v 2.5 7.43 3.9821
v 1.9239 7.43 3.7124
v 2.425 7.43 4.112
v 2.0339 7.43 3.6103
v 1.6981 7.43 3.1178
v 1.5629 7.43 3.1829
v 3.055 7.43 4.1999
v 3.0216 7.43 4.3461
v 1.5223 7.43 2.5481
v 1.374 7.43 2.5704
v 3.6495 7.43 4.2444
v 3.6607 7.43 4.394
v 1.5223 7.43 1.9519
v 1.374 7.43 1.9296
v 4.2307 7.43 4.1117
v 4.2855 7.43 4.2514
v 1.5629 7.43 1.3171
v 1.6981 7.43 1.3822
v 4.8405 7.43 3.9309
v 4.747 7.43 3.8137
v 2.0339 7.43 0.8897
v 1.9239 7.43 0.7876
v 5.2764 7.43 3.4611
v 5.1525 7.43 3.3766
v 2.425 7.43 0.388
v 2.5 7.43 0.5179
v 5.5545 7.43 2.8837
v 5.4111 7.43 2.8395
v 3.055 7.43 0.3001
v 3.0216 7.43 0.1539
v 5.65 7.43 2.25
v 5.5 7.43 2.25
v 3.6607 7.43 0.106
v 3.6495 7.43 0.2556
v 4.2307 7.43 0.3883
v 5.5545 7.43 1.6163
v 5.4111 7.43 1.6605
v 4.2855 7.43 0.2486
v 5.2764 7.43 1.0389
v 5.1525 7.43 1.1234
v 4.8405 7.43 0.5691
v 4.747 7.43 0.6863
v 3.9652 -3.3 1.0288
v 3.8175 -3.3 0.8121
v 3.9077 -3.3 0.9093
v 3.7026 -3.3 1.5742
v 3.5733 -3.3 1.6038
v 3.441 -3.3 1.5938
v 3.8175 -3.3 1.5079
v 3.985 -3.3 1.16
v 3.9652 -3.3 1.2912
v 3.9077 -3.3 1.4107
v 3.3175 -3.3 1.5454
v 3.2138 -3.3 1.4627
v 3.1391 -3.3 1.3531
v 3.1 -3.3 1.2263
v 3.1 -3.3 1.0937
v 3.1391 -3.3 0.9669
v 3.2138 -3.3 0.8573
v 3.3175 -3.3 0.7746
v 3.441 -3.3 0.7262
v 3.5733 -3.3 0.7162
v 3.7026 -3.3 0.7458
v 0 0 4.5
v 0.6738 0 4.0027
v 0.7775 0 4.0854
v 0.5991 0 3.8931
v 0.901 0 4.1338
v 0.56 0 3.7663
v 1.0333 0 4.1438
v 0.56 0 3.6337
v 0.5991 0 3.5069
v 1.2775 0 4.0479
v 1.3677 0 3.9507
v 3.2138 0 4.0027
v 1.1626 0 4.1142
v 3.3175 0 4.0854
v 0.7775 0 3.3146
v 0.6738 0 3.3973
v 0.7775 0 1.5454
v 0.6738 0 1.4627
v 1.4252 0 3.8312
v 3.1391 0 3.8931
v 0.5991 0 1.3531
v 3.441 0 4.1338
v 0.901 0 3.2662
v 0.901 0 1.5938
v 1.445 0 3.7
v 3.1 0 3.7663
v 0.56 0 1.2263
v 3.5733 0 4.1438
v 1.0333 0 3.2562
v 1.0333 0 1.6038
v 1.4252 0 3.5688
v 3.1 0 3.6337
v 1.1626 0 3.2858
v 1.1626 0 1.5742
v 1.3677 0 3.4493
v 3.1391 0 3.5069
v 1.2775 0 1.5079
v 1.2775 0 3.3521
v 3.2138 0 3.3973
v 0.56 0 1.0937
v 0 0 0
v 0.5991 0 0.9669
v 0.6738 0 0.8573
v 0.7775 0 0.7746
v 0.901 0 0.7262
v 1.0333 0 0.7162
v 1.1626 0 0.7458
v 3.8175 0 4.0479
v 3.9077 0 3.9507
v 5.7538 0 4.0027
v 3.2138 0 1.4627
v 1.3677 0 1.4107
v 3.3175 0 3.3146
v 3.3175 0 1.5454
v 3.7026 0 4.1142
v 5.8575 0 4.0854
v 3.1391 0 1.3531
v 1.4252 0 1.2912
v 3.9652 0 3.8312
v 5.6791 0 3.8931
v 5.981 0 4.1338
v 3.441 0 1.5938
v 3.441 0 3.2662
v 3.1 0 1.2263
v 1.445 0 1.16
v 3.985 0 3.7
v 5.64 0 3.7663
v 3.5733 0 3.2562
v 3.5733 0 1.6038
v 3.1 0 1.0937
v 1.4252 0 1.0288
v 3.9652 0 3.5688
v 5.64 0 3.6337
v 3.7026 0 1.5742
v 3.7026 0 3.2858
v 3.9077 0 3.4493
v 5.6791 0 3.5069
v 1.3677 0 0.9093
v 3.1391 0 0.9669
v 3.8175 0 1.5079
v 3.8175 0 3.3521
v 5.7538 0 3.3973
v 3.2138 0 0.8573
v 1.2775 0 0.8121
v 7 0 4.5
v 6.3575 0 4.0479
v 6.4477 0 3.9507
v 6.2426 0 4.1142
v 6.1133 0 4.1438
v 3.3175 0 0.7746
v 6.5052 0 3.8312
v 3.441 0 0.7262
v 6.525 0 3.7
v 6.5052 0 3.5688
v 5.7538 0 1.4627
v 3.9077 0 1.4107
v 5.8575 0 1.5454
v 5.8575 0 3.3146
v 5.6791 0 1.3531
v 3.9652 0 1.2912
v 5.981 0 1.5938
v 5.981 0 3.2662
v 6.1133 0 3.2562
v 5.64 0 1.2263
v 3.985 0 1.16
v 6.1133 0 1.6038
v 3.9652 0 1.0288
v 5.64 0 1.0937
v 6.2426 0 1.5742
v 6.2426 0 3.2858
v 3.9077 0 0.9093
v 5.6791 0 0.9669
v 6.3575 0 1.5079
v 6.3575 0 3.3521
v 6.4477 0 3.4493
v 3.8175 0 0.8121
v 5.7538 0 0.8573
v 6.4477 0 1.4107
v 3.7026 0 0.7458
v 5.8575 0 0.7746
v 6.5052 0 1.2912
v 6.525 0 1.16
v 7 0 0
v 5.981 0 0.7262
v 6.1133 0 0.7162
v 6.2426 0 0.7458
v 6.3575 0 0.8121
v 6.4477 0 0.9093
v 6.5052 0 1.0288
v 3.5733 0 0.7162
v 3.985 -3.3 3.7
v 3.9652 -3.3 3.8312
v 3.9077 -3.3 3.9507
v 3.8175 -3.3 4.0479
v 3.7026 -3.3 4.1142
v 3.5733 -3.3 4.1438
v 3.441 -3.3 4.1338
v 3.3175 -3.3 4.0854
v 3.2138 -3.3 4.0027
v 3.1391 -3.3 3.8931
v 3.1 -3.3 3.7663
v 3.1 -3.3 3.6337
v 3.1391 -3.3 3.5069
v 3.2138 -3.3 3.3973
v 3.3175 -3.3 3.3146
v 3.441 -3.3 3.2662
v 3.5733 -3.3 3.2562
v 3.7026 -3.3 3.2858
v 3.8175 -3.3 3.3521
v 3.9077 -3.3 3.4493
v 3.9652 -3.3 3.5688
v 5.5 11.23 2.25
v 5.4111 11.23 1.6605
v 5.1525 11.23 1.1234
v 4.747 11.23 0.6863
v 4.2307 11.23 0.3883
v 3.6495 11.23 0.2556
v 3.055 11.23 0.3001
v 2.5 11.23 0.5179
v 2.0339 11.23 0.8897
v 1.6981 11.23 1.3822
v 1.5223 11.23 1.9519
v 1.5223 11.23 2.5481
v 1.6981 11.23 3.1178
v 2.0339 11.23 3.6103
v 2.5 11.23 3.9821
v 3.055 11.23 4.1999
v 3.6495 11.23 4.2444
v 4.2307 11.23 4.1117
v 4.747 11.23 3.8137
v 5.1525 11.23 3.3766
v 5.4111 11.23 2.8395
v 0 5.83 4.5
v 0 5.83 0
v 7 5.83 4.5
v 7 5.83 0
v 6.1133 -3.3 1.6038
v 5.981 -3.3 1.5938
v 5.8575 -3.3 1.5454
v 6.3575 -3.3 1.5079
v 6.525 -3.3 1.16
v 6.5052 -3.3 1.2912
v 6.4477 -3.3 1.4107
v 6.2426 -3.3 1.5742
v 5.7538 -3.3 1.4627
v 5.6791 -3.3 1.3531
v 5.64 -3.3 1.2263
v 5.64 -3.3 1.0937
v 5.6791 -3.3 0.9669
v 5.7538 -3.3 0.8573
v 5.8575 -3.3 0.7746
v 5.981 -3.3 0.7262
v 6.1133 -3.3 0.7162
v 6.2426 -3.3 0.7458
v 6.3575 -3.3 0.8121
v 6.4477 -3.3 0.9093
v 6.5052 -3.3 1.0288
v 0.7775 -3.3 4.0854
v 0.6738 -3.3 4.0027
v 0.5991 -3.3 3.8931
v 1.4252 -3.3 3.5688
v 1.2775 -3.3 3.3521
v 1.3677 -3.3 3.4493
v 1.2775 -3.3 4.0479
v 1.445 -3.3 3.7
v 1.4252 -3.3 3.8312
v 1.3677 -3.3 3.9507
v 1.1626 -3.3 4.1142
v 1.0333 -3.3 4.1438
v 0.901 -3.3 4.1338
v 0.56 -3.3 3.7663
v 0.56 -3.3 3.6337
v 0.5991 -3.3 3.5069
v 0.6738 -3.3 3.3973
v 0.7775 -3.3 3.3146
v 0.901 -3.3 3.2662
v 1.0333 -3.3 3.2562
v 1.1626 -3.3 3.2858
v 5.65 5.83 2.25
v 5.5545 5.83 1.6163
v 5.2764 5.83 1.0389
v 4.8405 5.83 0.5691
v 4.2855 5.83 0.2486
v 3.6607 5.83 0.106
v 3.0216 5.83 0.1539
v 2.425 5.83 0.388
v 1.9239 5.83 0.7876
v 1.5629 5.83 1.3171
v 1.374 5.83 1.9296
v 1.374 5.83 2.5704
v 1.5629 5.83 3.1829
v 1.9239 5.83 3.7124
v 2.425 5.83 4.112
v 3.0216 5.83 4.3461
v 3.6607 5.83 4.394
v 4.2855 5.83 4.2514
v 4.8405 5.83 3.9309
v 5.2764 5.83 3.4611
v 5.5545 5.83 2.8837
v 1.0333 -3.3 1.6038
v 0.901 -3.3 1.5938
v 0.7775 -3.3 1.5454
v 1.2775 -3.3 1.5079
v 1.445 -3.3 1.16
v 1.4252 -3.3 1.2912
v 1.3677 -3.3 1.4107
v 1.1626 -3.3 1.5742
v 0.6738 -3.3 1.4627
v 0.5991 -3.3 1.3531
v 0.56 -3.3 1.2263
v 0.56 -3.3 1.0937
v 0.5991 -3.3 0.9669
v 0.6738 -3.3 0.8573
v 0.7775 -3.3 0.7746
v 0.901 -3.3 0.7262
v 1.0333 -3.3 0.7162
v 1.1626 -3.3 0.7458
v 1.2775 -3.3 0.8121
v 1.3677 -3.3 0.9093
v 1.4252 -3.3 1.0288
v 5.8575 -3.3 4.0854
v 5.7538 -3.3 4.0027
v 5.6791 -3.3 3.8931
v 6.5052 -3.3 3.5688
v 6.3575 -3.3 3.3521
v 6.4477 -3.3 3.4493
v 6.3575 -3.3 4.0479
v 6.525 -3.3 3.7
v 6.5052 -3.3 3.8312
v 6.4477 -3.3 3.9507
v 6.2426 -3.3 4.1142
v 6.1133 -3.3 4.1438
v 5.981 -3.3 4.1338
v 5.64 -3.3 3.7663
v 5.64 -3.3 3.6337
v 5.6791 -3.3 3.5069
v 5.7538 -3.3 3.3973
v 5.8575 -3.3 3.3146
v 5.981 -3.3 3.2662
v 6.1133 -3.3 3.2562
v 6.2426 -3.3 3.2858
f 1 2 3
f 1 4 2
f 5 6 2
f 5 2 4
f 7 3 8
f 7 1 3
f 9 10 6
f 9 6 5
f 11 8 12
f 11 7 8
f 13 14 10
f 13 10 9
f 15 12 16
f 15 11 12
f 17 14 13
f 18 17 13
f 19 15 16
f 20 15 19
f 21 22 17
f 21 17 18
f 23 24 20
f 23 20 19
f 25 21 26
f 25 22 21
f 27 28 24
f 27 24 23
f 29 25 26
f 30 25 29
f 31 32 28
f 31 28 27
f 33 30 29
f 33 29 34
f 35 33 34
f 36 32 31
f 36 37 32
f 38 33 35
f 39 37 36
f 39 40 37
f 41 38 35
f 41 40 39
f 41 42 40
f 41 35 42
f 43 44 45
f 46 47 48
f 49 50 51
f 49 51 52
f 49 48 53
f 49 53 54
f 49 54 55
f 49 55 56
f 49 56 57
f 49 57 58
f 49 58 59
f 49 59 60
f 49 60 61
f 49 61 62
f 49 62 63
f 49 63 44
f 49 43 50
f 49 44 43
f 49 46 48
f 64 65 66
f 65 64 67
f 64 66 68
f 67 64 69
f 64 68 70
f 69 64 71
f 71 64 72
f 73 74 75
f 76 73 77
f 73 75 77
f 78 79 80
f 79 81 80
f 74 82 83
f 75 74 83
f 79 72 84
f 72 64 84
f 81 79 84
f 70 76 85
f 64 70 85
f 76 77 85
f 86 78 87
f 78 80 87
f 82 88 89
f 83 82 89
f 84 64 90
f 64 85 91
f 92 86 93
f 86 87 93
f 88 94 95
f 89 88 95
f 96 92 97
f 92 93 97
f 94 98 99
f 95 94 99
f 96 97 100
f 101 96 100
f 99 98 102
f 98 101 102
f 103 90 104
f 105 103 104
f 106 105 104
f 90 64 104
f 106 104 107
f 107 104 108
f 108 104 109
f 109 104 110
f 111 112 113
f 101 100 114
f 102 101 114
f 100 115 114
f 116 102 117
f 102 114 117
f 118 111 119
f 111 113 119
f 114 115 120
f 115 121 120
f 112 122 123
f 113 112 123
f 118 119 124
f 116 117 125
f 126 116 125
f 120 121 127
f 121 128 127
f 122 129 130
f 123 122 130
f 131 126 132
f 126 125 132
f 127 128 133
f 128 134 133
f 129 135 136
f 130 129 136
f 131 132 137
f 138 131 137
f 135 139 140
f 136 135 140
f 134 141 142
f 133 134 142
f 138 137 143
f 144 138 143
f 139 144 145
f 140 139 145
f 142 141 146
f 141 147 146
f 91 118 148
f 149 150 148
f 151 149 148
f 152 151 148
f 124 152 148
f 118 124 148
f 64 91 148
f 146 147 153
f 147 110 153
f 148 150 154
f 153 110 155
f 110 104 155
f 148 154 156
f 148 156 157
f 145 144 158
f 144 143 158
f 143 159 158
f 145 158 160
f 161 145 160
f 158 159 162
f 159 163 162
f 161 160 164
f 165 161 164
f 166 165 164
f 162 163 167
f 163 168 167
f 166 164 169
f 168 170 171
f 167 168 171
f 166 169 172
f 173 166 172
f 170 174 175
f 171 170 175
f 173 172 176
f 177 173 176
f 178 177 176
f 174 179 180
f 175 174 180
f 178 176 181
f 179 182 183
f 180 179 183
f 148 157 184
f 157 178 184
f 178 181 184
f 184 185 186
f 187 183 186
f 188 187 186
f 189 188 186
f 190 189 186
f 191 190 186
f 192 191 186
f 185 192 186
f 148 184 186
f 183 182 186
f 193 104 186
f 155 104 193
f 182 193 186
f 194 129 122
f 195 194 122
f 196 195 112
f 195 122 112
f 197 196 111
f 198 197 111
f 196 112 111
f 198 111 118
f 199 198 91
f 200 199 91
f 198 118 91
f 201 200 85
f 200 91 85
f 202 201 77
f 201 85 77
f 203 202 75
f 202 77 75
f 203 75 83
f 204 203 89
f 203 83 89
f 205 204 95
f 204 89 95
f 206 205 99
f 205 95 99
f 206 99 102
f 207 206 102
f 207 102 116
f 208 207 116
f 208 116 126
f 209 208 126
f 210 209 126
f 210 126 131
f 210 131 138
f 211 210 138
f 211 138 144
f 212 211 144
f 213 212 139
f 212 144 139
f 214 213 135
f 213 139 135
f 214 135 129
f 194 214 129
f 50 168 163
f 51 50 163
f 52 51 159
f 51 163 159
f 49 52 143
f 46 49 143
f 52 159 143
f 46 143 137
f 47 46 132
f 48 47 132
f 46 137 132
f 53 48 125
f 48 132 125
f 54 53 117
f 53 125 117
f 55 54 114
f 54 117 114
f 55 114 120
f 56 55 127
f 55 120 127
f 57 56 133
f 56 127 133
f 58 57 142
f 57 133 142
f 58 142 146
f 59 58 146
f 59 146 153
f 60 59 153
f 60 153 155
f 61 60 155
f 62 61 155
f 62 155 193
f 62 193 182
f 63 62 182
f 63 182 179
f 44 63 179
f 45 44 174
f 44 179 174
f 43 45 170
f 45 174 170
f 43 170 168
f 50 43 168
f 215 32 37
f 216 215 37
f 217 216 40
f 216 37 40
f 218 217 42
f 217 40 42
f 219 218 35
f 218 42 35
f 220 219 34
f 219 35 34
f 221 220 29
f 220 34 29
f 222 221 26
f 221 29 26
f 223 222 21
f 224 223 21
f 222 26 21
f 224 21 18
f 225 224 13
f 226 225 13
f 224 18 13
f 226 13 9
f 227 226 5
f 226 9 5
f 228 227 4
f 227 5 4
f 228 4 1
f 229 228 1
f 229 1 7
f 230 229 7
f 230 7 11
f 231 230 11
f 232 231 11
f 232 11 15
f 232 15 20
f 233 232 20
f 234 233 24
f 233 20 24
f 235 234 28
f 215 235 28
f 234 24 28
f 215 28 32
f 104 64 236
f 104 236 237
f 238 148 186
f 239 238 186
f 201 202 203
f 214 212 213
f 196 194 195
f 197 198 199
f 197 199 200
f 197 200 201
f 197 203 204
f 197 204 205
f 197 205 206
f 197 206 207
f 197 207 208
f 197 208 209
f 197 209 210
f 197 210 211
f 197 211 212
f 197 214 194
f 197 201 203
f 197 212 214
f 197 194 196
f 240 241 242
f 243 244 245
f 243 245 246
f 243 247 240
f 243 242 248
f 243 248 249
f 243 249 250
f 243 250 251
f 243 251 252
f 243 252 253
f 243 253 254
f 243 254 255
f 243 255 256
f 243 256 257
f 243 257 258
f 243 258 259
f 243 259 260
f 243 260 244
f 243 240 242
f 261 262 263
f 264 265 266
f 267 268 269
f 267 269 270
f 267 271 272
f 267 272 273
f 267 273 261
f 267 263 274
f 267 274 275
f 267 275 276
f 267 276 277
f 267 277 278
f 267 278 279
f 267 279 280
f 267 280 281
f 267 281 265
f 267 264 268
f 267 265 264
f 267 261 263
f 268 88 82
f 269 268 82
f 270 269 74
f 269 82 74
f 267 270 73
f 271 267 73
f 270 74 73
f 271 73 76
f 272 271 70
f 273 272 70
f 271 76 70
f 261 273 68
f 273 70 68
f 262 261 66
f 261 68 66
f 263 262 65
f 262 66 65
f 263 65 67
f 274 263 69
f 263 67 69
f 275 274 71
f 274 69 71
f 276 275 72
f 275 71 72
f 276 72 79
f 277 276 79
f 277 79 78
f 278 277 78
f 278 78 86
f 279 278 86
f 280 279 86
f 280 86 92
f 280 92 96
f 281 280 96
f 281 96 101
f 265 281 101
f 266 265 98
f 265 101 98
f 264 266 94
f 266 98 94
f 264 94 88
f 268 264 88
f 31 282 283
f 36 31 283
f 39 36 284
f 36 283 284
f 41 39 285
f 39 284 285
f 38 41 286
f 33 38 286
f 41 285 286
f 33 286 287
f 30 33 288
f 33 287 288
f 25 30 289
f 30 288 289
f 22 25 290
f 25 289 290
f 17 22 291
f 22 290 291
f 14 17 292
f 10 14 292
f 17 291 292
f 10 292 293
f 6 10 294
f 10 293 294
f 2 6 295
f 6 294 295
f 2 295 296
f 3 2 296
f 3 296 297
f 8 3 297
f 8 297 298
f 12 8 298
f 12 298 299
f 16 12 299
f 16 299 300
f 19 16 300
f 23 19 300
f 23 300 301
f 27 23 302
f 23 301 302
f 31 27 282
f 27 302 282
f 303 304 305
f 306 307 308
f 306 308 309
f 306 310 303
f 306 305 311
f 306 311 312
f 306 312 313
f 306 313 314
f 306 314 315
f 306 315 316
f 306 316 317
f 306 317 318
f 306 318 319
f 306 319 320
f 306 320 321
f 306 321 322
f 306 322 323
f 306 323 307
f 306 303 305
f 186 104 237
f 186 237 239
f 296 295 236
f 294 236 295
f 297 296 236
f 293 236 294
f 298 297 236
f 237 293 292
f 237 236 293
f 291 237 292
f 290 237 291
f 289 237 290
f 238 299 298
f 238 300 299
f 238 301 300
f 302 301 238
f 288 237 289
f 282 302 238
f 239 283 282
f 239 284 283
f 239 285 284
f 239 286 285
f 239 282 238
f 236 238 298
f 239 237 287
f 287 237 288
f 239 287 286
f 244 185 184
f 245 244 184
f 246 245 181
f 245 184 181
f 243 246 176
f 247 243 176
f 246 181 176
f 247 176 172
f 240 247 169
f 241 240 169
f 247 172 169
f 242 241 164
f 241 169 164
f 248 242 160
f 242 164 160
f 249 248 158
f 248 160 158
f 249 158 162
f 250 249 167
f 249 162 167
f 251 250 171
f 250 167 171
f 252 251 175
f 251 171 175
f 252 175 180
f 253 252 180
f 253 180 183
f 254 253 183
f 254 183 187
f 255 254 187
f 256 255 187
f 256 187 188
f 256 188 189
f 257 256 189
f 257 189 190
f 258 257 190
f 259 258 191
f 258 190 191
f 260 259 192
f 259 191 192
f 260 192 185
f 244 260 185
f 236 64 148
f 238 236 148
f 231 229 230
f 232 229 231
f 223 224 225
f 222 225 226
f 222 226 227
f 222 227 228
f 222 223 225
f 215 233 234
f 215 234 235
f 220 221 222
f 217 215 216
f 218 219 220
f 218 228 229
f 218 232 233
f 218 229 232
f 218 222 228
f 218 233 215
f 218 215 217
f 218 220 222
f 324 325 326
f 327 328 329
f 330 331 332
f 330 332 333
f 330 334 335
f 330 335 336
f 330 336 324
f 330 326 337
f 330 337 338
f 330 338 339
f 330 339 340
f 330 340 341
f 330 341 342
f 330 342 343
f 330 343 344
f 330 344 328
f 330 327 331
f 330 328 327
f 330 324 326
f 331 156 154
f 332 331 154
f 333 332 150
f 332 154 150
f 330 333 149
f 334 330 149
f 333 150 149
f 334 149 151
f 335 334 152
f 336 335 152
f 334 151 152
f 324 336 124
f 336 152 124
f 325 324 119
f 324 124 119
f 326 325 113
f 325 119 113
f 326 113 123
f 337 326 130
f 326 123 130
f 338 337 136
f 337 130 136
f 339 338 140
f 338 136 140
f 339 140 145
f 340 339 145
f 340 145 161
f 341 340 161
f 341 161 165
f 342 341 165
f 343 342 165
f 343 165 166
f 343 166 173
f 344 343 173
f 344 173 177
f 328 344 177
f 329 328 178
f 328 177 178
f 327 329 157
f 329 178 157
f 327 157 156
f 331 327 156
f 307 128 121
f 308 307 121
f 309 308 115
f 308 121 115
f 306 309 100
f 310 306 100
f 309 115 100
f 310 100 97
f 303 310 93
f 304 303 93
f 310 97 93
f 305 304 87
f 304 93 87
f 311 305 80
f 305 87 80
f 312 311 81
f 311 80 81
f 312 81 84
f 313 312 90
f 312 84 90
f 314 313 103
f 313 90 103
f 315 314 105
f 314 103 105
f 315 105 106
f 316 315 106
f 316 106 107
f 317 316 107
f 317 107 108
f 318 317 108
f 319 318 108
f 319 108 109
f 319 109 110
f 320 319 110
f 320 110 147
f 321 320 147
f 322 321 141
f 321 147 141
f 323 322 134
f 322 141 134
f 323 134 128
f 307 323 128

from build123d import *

# Parameters (mm, degrees)
SKETCH1_W           = 7
SKETCH1_H           = 4.5
BOSS_EXTRUDE1_DEPTH = 5.83
SKETCH2_R           = 2.15
BOSS_EXTRUDE2_DEPTH = 1.6
SKETCH3_R           = 2
BOSS_EXTRUDE3_DEPTH = 3.8
SKETCH4_R           = 0.445
BOSS_EXTRUDE4_DEPTH = 3.3


with BuildPart() as part:
    # Sketch1 → Boss-Extrude1 (new body)
    with BuildSketch(Plane(origin=(0, 0, 0), x_dir=(1, 0, 0), z_dir=(0, 1, 0))):
        with Locations((3.5, -2.25)):
            Rectangle(SKETCH1_W, SKETCH1_H)
    extrude(amount=BOSS_EXTRUDE1_DEPTH)

    # Sketch2 → Boss-Extrude2 (add)
    with BuildSketch(Plane(origin=(0, 5.83, 0), x_dir=(1, 0, 0), z_dir=(0, 1, 0))):
        with Locations((3.5, -2.25)):
            Circle(SKETCH2_R)
    extrude(amount=BOSS_EXTRUDE2_DEPTH)

    # Sketch3 → Boss-Extrude3 (add)
    with BuildSketch(Plane(origin=(0, 7.43, 0), x_dir=(1, 0, 0), z_dir=(0, 1, 0))):
        with Locations((3.5, -2.25)):
            Circle(SKETCH3_R)
    extrude(amount=BOSS_EXTRUDE3_DEPTH)

    # Sketch4 → Boss-Extrude4 (add)
    with BuildSketch(Plane.XZ):
        with Locations((1, 3.7)):
            Circle(SKETCH4_R)
        with Locations((3.54, 3.7)):
            Circle(SKETCH4_R)
        with Locations((6.08, 3.7)):
            Circle(SKETCH4_R)
        with Locations((6.08, 1.16)):
            Circle(SKETCH4_R)
        with Locations((3.54, 1.16)):
            Circle(SKETCH4_R)
        with Locations((1, 1.16)):
            Circle(SKETCH4_R)
    extrude(amount=BOSS_EXTRUDE4_DEPTH)


solid = part.part
